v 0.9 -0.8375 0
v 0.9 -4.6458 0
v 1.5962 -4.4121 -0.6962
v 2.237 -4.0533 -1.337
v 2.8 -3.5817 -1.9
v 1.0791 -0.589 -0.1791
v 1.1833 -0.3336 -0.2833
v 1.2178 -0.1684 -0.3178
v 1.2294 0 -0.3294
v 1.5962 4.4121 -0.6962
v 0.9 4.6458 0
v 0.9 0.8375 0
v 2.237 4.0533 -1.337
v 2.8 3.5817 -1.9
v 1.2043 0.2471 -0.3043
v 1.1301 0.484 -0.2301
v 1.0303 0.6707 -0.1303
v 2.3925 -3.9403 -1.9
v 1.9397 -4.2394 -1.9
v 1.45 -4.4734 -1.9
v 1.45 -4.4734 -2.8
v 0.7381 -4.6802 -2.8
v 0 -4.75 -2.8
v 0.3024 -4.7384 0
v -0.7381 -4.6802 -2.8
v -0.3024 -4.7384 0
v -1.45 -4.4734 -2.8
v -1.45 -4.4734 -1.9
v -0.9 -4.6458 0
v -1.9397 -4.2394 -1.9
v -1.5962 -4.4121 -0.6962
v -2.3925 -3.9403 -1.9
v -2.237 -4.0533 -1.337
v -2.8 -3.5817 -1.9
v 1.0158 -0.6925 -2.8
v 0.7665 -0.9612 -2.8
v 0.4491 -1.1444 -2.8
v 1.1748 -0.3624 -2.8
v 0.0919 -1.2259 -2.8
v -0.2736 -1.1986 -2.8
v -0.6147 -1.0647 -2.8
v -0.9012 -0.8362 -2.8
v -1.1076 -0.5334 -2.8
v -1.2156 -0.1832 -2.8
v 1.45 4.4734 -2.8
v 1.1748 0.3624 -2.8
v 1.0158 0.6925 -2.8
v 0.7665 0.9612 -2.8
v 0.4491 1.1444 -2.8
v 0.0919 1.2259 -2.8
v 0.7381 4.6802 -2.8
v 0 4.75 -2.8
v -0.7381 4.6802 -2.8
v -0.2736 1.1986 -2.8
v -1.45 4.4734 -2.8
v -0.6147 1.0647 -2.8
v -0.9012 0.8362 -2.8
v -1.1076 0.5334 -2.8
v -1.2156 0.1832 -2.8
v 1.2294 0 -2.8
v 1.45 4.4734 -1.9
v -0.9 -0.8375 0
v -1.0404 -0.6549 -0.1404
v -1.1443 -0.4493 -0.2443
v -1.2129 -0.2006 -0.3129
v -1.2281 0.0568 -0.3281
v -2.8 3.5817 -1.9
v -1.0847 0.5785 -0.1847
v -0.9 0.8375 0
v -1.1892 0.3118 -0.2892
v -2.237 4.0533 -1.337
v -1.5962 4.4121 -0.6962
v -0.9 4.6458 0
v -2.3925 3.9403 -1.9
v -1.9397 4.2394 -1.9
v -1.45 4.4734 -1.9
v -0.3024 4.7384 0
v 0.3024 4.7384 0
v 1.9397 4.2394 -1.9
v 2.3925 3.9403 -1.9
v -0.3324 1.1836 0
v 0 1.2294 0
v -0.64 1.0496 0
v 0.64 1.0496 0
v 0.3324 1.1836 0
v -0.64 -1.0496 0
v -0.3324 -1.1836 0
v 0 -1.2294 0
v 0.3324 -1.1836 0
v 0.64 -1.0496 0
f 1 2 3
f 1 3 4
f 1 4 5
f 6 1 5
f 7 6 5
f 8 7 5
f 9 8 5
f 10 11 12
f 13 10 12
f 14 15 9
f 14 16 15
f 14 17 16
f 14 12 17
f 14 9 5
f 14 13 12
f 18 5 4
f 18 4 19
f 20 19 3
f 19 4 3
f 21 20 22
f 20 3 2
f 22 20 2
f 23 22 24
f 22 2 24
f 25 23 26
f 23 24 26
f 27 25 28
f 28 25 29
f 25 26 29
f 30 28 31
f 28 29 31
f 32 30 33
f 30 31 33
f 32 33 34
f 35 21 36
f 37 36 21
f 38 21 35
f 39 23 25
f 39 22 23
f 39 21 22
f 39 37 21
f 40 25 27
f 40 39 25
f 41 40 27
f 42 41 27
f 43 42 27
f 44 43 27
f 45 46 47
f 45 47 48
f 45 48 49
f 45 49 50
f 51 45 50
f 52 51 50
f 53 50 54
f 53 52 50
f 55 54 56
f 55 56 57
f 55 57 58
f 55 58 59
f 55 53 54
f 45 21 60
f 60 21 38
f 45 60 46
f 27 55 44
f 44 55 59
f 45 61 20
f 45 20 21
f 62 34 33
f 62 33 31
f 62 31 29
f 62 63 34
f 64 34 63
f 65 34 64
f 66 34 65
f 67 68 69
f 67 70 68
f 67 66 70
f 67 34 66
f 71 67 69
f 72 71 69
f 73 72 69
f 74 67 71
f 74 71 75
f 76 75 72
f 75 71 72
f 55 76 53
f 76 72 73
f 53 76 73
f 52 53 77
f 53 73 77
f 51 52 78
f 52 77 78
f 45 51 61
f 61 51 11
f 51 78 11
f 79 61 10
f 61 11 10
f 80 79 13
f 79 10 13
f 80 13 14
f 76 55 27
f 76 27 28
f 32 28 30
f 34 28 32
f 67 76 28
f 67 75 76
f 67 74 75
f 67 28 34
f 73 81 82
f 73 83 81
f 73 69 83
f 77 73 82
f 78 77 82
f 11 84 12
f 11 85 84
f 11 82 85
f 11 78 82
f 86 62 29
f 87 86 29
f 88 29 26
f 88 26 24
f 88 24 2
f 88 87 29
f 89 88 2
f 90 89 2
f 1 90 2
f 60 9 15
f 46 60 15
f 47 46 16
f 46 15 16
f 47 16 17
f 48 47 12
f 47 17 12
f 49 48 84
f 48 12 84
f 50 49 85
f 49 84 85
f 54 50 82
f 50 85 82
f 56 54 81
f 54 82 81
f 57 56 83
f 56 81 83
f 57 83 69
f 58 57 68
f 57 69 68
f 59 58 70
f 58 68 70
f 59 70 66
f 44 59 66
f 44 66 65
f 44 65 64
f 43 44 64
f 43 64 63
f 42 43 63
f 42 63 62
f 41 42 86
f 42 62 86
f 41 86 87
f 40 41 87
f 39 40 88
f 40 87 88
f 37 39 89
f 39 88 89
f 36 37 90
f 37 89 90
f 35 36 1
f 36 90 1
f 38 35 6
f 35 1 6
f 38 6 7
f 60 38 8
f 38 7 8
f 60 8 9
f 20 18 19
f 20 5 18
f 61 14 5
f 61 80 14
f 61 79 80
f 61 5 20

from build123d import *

# Parameters (mm, degrees)
BOSS_EXTRU_1_DEPTH      = 4.75
ESQUISSE1_OUTSIDE_W     = 9.876
ESQUISSE1_OUTSIDE_H     = 13.776
ENL_V_MAT_EXTRU_1_DEPTH = 7.18405207
TROU_TARAUD_M31_D       = 2.45875


with BuildPart() as part:
    # Esquisse2 → Boss.-Extru.1 (new, symmetric)
    with BuildSketch(Plane(origin=(0, 0, 0), x_dir=(1, 0, 0), z_dir=(0, 1, 0))):
        Polygon((0.9, 0), (2.8, 1.9), (1.45, 1.9), (1.45, 2.8), (-1.45, 2.8), (-1.45, 1.9), (-2.8, 1.9), (-0.9, 0), align=None)
    extrude(amount=BOSS_EXTRU_1_DEPTH, both=True)

    # Esquisse1 outside → Enlèv. mat.-Extru.1 (cut, through all)
    with BuildSketch(Plane.XY):
        Rectangle(ESQUISSE1_OUTSIDE_W, ESQUISSE1_OUTSIDE_H)
        with BuildLine():
            Line((-2.8, -3.581739419), (-2.8, 3.581739419))
            ThreePointArc((-2.8, 3.581739419), (0, 4.75), (2.8, 3.581739419))
            Line((2.8, 3.581739419), (2.8, -3.581739419))
            ThreePointArc((2.8, -3.581739419), (0, -4.75), (-2.8, -3.581739419))
        make_face(mode=Mode.SUBTRACT)
    extrude(amount=-ENL_V_MAT_EXTRU_1_DEPTH, mode=Mode.SUBTRACT)

    # Trou taraudé M31 (through all)
    with Locations(Plane(origin=(0, 0, -2.8), x_dir=(-1, 0, 0), z_dir=(0, 0, -1))):
        with Locations((0, 0)):
            Hole(TROU_TARAUD_M31_D / 2)


solid = part.part
